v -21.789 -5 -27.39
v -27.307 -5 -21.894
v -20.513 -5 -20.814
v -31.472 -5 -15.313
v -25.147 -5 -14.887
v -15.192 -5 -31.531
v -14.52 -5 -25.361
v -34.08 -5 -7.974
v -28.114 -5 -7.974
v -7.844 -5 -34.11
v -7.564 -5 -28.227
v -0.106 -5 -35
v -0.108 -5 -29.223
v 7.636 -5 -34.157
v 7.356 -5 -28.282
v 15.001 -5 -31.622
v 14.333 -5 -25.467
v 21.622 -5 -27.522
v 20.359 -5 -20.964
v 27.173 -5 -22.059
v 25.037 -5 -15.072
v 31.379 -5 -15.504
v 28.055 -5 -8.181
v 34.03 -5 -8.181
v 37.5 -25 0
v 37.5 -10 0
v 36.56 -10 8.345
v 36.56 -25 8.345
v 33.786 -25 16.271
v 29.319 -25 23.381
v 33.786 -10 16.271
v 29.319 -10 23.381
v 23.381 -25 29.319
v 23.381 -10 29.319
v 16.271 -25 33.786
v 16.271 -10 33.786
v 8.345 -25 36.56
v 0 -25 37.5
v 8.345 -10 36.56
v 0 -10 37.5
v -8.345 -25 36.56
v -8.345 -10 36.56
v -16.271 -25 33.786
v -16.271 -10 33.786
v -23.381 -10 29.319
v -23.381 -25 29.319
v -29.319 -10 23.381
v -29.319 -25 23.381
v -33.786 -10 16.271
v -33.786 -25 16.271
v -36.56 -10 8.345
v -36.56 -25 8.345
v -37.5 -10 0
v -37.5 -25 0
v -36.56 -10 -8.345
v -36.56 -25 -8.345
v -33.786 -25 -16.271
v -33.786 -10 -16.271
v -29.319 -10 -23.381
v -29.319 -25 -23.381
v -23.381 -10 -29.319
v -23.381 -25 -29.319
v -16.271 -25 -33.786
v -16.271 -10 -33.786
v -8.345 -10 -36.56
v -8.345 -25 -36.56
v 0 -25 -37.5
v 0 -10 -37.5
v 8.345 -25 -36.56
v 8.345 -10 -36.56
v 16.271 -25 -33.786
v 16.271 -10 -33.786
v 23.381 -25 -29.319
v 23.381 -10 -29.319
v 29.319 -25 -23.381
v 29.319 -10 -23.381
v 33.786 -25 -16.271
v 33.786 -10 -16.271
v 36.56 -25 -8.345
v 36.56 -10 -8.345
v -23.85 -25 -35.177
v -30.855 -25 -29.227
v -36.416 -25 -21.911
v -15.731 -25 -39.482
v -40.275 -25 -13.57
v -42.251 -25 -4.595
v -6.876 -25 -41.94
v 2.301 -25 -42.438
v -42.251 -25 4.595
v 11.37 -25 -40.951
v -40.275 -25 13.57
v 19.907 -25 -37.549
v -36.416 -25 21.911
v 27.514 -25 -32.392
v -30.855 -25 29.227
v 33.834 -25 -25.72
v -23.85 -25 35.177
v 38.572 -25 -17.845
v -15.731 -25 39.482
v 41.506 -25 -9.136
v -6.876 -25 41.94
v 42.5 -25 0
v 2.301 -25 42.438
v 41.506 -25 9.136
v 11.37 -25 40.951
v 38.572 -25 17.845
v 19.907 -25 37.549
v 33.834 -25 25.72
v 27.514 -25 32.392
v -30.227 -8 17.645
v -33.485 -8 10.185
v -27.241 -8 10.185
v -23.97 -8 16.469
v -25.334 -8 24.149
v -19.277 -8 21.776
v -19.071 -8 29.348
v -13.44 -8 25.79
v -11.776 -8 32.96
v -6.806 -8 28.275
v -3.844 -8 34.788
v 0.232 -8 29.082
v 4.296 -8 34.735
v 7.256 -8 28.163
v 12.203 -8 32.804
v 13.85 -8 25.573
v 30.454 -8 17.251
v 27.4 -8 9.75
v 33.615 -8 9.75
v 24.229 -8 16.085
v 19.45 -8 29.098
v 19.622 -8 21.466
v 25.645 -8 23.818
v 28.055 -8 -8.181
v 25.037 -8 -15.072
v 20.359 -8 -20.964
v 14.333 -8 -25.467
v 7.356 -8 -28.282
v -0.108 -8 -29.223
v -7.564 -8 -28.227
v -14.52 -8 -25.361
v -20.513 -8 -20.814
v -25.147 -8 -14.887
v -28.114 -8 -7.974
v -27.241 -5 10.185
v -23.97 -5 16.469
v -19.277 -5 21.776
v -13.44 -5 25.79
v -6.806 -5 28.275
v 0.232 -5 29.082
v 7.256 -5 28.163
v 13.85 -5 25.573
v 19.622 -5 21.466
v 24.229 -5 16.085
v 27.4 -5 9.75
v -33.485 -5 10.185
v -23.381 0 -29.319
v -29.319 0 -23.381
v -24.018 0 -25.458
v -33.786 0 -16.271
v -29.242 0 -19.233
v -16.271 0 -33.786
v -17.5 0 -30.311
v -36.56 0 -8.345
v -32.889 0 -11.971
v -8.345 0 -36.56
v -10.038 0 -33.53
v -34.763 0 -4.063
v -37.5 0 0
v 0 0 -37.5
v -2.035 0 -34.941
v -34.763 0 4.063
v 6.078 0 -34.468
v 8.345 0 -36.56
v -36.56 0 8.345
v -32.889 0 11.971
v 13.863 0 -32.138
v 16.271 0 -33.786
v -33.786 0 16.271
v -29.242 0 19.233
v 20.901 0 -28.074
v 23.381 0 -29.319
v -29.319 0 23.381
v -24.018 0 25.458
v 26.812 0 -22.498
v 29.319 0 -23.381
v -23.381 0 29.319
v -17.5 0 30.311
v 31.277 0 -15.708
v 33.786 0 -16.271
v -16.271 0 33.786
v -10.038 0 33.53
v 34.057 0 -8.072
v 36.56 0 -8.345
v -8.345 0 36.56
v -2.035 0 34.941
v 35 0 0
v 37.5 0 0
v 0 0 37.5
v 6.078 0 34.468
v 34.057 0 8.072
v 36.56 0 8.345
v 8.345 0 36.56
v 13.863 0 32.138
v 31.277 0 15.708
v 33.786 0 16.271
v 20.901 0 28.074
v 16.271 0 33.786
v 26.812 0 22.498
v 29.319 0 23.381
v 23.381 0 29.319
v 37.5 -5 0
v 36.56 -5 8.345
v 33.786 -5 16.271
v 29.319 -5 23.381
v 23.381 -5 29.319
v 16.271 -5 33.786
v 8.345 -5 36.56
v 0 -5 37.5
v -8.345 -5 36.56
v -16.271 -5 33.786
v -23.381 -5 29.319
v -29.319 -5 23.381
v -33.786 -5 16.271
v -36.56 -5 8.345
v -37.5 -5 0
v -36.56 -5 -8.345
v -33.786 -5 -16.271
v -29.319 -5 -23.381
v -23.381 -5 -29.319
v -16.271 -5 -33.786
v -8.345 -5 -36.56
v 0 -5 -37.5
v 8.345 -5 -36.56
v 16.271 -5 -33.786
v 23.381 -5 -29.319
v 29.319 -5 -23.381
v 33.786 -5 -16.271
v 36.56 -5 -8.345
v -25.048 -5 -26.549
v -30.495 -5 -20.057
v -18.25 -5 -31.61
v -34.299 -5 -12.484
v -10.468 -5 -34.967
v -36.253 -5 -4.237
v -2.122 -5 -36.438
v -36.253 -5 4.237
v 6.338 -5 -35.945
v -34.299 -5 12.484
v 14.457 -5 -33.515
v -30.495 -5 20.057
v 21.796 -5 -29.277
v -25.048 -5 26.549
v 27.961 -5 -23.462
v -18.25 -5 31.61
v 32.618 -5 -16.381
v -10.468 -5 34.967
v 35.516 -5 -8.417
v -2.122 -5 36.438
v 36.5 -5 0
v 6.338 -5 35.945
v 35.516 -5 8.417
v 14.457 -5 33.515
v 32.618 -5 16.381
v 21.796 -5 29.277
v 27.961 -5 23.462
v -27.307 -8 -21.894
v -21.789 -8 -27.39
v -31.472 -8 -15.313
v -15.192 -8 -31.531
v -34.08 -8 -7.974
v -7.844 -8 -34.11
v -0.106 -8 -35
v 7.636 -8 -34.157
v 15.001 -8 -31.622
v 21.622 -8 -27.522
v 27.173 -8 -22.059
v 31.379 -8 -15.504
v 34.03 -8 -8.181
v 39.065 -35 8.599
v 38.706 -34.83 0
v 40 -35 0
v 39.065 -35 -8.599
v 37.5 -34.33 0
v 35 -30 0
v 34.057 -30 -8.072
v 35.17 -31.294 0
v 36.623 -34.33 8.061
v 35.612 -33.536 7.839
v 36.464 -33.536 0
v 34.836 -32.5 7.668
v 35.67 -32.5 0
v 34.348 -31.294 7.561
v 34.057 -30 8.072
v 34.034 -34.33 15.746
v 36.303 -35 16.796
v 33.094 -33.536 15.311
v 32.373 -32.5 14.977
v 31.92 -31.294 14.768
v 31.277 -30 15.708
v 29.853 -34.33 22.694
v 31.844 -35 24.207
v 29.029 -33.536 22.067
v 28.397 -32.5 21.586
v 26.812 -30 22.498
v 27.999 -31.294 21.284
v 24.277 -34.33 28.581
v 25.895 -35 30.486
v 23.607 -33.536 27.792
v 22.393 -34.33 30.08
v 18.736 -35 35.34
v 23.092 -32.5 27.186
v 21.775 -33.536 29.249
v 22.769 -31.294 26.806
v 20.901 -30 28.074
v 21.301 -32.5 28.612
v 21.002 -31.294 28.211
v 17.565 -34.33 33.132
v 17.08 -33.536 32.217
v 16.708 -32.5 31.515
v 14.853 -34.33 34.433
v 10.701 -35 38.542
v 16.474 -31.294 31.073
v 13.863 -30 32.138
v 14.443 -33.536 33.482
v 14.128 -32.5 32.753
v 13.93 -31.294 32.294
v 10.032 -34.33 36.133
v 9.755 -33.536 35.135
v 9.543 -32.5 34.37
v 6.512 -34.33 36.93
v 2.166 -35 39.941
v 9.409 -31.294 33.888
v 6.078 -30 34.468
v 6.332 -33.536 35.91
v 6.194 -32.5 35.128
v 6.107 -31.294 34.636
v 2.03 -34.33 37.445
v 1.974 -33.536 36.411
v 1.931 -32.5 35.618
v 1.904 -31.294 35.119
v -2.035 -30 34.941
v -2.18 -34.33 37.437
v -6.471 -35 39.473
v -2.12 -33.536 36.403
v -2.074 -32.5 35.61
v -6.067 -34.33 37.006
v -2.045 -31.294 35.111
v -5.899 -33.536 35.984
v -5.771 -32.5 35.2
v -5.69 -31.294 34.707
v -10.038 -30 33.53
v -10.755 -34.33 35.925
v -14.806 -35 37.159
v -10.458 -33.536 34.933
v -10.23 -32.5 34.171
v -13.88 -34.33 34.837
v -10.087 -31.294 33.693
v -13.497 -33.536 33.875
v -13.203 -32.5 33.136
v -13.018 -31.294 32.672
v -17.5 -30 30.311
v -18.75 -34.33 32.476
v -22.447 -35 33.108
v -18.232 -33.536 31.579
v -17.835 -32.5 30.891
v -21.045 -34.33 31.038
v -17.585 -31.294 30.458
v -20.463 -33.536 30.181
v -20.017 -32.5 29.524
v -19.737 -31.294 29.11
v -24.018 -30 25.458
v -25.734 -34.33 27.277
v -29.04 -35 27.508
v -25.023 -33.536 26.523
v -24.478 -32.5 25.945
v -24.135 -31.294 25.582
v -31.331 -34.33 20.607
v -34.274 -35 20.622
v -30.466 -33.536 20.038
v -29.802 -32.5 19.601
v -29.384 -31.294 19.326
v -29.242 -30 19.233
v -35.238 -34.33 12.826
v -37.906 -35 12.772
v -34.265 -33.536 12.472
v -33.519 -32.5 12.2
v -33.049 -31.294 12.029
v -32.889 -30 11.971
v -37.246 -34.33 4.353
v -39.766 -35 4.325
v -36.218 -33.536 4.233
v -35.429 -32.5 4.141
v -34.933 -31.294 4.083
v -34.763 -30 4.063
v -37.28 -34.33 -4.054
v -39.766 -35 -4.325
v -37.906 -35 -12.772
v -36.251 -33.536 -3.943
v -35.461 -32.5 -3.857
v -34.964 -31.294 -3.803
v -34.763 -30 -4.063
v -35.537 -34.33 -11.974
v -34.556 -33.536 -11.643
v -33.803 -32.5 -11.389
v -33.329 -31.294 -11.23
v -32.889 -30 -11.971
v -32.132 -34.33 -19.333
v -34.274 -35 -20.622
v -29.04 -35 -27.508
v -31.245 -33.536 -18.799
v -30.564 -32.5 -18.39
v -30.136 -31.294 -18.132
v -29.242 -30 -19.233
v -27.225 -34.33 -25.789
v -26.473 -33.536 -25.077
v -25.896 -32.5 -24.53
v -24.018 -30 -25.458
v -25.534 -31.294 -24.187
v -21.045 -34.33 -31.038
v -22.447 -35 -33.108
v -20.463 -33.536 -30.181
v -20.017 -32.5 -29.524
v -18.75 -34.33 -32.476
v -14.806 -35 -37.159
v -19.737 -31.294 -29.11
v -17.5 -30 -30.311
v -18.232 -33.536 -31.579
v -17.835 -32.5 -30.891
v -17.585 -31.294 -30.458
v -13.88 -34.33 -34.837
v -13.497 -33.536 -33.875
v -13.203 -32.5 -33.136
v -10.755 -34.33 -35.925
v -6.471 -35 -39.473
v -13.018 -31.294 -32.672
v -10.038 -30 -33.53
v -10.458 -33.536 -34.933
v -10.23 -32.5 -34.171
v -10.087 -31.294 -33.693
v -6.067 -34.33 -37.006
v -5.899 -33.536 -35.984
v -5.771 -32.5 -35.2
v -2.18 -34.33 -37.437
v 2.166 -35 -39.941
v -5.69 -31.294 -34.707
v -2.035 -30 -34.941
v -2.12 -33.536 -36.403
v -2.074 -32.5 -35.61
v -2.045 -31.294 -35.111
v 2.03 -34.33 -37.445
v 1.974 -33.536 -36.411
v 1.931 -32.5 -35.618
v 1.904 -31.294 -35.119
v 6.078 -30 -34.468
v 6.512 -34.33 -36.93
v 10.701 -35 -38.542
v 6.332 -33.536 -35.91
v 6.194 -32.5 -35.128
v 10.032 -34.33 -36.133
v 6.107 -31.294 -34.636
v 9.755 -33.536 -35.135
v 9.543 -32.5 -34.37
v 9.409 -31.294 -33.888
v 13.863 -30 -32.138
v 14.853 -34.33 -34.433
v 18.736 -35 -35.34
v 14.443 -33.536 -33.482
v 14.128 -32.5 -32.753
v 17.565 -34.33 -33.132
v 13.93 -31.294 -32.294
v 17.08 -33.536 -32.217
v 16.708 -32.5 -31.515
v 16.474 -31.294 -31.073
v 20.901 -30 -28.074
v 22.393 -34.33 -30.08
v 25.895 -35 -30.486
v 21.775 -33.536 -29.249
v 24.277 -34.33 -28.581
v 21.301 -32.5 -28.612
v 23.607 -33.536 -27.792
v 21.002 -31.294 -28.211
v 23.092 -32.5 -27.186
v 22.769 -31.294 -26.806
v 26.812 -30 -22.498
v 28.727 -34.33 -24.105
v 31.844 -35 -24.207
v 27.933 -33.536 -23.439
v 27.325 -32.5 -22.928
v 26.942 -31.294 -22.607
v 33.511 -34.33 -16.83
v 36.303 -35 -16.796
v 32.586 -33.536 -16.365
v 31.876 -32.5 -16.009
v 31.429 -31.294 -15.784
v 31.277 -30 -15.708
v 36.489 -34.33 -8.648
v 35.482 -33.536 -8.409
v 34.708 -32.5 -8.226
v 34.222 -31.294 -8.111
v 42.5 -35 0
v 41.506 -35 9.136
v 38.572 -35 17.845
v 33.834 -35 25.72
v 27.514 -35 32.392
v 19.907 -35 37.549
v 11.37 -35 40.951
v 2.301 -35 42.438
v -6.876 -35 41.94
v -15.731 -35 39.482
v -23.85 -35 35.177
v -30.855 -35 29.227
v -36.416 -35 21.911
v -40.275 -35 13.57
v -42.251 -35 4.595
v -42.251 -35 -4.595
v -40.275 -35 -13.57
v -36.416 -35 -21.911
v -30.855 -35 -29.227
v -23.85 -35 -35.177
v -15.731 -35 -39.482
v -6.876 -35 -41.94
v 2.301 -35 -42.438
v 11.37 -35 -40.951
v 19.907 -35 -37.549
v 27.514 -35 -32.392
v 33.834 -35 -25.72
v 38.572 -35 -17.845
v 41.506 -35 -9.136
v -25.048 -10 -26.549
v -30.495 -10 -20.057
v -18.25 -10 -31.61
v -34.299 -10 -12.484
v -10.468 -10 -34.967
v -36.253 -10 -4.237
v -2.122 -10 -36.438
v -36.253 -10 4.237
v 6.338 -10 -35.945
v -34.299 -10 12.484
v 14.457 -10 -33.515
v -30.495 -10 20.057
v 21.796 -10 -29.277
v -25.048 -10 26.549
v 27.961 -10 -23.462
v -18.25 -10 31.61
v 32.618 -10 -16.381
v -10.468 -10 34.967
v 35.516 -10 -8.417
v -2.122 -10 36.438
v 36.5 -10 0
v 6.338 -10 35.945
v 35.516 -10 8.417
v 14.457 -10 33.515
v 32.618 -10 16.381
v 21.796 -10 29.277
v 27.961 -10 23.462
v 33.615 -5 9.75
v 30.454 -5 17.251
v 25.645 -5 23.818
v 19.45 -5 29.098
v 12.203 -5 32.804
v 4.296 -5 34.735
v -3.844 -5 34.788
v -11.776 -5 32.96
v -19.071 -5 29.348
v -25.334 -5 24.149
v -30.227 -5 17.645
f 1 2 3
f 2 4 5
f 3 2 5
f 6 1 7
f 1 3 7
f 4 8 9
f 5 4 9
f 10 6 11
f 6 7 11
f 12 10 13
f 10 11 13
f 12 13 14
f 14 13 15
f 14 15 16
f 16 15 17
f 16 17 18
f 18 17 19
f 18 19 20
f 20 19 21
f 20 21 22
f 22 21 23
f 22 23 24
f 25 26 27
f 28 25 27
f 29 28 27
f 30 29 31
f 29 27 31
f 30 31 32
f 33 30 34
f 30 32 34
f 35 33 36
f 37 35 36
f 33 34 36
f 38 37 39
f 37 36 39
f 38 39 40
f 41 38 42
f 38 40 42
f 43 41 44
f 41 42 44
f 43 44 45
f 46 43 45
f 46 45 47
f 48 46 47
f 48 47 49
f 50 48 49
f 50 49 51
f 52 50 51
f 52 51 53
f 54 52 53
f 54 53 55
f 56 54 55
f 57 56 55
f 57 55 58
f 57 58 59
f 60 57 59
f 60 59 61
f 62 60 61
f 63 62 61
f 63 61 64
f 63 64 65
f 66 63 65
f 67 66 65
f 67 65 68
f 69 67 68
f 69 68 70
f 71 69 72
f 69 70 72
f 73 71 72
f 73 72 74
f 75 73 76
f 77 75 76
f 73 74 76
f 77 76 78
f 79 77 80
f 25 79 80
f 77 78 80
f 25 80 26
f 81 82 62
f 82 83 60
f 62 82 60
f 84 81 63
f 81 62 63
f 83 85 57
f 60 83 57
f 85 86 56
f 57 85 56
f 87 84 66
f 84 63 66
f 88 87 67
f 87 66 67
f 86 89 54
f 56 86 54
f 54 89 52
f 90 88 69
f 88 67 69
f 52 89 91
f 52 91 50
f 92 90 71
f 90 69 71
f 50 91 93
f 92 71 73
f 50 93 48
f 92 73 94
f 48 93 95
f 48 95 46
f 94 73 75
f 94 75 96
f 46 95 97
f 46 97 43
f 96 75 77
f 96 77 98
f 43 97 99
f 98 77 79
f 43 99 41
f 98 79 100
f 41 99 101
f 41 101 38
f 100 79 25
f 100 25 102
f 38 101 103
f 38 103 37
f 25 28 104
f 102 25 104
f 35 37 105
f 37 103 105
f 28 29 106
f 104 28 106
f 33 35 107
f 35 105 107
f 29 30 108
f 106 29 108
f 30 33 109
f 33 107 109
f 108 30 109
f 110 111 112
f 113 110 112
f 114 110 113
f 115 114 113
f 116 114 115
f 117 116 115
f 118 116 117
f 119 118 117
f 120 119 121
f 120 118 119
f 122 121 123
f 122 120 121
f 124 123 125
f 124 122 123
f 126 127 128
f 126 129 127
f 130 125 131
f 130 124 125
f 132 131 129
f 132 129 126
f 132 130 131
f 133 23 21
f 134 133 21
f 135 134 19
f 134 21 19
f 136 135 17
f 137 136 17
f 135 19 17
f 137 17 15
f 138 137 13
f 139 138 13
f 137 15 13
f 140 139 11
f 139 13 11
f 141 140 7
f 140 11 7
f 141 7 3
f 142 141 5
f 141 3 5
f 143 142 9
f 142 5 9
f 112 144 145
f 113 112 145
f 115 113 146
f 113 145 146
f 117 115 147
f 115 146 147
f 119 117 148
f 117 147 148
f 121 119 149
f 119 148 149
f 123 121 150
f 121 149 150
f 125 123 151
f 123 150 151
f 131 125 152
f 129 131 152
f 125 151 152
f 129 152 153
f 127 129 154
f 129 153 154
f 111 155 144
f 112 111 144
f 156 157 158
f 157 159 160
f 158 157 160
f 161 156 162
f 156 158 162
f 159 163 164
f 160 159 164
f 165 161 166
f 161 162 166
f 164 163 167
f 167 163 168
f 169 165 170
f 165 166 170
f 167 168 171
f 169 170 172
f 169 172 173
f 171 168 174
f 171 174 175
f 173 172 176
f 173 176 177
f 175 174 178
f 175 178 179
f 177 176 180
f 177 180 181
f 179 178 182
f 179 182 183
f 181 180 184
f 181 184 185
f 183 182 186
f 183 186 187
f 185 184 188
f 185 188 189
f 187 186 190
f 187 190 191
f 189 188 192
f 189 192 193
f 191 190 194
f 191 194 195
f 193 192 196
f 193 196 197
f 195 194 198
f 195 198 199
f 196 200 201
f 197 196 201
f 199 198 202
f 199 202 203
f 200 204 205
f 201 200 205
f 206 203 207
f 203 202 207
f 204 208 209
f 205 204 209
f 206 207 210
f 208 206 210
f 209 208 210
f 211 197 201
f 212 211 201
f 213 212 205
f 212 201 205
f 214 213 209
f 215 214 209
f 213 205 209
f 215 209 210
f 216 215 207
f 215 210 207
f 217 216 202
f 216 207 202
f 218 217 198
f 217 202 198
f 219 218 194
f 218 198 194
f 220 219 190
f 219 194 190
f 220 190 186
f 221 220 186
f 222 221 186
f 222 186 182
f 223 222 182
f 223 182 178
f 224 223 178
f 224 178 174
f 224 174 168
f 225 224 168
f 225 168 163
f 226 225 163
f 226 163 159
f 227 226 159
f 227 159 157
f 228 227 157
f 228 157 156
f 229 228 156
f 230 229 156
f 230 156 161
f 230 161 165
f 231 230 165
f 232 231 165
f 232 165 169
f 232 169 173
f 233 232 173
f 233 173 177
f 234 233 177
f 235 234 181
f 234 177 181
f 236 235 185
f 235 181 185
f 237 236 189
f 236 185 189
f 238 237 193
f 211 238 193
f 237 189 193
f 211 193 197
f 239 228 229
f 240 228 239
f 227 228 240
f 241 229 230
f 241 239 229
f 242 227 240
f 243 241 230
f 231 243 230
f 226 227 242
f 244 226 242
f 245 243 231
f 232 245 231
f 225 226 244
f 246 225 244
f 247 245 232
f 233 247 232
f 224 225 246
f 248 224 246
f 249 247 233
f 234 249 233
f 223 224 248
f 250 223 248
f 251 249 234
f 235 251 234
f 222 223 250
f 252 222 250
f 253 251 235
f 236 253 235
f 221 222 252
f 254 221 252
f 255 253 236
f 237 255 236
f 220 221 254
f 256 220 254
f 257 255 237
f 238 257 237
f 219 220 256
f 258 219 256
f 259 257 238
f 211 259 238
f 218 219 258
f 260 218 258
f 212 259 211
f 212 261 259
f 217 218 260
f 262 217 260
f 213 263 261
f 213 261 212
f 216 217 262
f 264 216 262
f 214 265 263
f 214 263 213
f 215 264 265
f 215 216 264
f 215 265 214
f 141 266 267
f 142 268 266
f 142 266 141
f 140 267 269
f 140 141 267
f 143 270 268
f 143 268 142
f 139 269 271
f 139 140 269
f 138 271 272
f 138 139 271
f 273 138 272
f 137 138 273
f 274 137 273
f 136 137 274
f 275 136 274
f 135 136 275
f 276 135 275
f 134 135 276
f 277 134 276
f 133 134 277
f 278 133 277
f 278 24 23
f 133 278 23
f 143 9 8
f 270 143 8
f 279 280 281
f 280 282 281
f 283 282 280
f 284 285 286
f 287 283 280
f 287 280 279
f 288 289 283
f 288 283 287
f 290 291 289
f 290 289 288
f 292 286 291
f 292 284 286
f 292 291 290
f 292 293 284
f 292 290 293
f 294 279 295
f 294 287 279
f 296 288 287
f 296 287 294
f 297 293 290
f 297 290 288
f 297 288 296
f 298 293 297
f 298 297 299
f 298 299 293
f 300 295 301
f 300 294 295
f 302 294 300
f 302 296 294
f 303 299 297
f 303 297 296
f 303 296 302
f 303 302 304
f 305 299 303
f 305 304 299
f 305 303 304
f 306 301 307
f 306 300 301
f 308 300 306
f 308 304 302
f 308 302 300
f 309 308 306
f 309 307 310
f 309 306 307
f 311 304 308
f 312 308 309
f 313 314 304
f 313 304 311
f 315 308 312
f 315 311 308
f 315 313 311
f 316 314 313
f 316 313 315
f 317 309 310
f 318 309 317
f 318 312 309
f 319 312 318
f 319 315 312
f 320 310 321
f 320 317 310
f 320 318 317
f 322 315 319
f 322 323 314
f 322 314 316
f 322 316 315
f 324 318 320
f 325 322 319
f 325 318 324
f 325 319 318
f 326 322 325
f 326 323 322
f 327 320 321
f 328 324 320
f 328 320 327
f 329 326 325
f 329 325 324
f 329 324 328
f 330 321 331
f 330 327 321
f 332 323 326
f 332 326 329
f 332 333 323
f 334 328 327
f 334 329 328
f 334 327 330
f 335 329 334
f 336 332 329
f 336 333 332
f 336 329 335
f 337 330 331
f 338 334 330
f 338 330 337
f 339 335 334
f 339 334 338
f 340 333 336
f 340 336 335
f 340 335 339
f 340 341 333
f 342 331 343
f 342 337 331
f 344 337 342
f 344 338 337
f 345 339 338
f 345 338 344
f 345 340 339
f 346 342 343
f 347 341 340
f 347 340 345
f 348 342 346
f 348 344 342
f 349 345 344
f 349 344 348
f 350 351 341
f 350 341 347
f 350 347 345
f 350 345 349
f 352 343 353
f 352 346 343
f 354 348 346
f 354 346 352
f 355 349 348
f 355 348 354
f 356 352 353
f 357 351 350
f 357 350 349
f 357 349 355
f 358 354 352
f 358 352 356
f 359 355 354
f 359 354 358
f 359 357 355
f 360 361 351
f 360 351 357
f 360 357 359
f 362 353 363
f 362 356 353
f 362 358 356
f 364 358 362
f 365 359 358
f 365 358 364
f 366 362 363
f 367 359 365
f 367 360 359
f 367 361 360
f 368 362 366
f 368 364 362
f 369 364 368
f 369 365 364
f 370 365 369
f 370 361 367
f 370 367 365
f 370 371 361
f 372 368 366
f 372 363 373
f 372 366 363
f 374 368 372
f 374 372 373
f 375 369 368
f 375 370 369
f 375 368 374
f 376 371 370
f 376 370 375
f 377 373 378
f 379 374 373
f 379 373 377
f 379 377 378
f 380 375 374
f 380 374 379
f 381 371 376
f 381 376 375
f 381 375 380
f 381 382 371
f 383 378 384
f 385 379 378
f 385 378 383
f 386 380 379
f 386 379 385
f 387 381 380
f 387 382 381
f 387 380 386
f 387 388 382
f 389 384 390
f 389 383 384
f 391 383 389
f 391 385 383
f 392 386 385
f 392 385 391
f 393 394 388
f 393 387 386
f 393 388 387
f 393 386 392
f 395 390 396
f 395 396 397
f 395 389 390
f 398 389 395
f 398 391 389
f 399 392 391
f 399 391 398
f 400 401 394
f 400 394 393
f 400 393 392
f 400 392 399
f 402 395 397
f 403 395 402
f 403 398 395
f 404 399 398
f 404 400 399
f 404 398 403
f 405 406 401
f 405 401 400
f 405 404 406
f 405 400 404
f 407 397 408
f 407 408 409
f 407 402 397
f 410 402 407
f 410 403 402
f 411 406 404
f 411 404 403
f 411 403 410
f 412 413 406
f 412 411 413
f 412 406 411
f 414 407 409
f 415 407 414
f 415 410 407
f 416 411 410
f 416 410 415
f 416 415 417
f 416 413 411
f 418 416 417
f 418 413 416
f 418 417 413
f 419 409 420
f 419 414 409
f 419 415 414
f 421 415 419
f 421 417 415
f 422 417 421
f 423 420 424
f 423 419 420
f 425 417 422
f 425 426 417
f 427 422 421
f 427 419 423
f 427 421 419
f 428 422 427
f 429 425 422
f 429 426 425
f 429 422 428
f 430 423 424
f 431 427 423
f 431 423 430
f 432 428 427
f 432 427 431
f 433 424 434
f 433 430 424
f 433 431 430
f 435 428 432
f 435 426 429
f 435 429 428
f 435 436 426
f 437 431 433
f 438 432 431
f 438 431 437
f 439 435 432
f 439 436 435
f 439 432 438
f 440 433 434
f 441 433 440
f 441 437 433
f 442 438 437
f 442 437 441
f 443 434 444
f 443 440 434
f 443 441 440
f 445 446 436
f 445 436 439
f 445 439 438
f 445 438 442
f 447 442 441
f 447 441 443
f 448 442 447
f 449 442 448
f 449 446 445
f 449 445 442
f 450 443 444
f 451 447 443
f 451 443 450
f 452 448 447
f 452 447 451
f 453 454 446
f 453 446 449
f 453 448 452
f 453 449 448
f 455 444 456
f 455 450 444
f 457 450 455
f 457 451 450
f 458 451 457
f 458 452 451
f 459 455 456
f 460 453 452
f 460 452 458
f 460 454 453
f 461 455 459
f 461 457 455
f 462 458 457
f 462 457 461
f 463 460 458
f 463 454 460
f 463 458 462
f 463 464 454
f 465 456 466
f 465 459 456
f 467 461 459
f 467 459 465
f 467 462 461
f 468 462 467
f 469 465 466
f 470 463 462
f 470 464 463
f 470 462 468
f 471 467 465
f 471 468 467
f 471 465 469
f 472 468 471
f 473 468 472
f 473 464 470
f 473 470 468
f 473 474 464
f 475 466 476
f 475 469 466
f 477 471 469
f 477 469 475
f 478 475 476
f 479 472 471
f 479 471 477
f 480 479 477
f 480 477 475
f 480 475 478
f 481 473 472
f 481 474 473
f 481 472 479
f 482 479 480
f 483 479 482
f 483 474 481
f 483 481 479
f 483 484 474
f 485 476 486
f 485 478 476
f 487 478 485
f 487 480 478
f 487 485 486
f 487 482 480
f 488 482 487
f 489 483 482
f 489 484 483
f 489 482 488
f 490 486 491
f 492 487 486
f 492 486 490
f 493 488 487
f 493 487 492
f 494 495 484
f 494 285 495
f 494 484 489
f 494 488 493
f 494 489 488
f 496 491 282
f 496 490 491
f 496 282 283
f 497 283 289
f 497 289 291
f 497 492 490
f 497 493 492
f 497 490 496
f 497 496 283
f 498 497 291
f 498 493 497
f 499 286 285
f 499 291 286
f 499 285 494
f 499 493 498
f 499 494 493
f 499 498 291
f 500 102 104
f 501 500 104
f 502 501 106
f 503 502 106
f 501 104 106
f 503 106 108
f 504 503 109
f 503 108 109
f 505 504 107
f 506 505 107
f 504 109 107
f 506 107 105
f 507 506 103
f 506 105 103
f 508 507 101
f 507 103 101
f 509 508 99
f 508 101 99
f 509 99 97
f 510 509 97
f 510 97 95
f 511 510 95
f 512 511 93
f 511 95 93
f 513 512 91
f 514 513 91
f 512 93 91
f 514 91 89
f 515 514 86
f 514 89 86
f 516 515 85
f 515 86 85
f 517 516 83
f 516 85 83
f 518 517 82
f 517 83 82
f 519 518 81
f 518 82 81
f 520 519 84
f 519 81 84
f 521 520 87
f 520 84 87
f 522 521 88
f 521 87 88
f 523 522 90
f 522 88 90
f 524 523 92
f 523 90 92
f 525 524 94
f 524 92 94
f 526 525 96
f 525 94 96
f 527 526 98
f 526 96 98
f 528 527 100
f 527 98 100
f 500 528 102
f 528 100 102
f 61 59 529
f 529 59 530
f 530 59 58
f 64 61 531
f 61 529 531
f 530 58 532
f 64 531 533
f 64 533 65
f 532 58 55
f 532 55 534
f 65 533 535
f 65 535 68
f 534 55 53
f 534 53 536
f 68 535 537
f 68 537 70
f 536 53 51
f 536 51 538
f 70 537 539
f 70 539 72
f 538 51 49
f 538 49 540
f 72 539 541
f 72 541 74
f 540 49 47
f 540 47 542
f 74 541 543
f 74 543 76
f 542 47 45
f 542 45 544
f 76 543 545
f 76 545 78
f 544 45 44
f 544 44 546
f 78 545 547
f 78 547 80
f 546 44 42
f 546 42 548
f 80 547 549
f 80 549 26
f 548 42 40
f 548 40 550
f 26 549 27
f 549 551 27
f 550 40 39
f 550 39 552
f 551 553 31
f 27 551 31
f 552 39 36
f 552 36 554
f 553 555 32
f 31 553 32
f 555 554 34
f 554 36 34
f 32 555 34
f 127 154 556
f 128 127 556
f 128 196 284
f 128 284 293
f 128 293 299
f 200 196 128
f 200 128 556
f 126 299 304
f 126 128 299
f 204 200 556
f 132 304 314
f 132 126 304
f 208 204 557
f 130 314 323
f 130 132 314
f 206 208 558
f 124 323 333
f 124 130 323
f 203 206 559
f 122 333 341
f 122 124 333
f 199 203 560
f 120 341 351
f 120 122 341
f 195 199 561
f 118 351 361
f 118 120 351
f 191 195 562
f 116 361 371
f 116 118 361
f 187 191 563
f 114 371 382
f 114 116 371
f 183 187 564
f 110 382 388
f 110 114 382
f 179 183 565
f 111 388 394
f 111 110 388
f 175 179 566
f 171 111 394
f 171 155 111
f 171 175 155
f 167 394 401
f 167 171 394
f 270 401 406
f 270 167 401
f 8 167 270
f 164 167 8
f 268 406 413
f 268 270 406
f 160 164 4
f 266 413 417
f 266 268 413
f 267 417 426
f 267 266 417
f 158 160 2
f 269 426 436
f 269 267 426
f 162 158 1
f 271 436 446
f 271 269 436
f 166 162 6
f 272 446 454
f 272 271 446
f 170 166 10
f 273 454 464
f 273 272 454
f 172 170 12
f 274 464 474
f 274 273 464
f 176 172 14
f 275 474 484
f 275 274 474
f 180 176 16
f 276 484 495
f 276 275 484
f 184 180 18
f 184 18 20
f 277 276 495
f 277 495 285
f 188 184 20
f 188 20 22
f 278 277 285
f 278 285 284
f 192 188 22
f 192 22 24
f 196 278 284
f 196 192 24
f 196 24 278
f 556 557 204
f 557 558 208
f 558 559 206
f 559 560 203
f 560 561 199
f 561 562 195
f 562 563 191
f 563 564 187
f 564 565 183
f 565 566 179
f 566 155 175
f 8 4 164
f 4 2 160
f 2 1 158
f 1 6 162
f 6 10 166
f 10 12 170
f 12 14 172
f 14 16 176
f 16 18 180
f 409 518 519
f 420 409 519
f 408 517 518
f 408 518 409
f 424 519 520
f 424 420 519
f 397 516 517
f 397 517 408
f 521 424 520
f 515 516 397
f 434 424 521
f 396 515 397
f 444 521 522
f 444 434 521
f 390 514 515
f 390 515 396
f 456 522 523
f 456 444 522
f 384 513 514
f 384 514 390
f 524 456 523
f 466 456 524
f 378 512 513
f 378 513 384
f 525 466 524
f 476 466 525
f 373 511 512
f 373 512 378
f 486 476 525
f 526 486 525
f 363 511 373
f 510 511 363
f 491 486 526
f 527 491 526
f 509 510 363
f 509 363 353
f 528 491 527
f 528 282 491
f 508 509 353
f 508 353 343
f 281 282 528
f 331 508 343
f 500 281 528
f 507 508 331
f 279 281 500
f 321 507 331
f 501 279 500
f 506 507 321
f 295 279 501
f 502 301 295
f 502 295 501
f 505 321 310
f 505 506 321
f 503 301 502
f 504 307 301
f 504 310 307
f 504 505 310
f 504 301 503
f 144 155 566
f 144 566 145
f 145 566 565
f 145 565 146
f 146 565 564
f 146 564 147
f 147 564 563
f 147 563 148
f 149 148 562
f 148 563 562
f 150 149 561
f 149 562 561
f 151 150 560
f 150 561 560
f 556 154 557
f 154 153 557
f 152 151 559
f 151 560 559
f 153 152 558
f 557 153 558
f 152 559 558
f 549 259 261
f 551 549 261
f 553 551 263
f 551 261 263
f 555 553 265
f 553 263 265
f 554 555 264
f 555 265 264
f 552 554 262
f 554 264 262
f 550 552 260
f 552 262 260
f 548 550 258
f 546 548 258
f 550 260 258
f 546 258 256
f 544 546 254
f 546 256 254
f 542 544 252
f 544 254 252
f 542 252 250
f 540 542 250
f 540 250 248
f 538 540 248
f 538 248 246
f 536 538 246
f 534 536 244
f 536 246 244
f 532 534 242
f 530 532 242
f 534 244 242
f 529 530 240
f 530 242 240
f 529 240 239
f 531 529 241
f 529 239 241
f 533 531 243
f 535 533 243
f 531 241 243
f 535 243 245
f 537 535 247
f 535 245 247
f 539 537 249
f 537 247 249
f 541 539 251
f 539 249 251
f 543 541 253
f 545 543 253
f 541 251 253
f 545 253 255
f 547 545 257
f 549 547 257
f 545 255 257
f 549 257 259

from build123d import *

# Parameters (mm, degrees)
F0_R      = 37.5
F0_R_2    = 35
F1_DEPTH  = 25
F2_R      = 42.5
F2_R_2    = 35
F3_DEPTH  = 10
F4_R      = 5
F6_R      = 37.5
F6_R_2    = 36.5
F7_DEPTH  = 5
F9_DEPTH  = 3
F11_DEPTH = 3


with BuildPart() as f1:
    # F0 (on Front) → F1 (new body)
    with BuildSketch(Plane.XZ):
        Circle(F0_R)
        Circle(F0_R_2, mode=Mode.SUBTRACT)
    extrude(amount=F1_DEPTH)

    # F2 (on face) → F3 (join)
    with BuildSketch(Plane.XZ.offset(25)):
        Circle(F2_R)
        Circle(F2_R_2, mode=Mode.SUBTRACT)
    extrude(amount=F3_DEPTH)

    # F4
    f4_edges = [f1.edges().sort_by_distance(p)[0] for p in [
        (-35, -35, 0),
    ]]
    fillet(f4_edges, radius=F4_R)

    # F6 (on offset) → F7 (cut)
    with BuildSketch(Plane.XZ.offset(5)):
        Circle(F6_R)
        Circle(F6_R_2, mode=Mode.SUBTRACT)
    extrude(amount=F7_DEPTH, mode=Mode.SUBTRACT)

    # F8 (on offset) → F9 (join)
    with BuildSketch(Plane.XZ.offset(5)):
        with BuildLine():
            Line((27.399526, 9.749617), (33.614654, 9.749617))
            ThreePointArc((33.614654, 9.749617), (0.227268, 34.999262), (-33.485206, 10.185331))
            Line((-33.485206, 10.185331), (-27.24056, 10.185331))
            ThreePointArc((-27.24056, 10.185331), (0.231904, 29.081528), (27.399526, 9.749617))
        make_face()
    extrude(amount=F9_DEPTH)

    # F10 (on offset) → F11 (join)
    with BuildSketch(Plane.XZ.offset(5)):
        with BuildLine():
            Line((-28.114079, -7.974047), (-34.079533, -7.974047))
            ThreePointArc((-34.079533, -7.974047), (-0.106236, -34.999839), (34.030498, -8.180783))
            Line((34.030498, -8.180783), (28.054619, -8.180783))
            ThreePointArc((28.054619, -8.180783), (-0.107558, -29.222855), (-28.114079, -7.974047))
        make_face()
    extrude(amount=F11_DEPTH)


solid = f1.part
